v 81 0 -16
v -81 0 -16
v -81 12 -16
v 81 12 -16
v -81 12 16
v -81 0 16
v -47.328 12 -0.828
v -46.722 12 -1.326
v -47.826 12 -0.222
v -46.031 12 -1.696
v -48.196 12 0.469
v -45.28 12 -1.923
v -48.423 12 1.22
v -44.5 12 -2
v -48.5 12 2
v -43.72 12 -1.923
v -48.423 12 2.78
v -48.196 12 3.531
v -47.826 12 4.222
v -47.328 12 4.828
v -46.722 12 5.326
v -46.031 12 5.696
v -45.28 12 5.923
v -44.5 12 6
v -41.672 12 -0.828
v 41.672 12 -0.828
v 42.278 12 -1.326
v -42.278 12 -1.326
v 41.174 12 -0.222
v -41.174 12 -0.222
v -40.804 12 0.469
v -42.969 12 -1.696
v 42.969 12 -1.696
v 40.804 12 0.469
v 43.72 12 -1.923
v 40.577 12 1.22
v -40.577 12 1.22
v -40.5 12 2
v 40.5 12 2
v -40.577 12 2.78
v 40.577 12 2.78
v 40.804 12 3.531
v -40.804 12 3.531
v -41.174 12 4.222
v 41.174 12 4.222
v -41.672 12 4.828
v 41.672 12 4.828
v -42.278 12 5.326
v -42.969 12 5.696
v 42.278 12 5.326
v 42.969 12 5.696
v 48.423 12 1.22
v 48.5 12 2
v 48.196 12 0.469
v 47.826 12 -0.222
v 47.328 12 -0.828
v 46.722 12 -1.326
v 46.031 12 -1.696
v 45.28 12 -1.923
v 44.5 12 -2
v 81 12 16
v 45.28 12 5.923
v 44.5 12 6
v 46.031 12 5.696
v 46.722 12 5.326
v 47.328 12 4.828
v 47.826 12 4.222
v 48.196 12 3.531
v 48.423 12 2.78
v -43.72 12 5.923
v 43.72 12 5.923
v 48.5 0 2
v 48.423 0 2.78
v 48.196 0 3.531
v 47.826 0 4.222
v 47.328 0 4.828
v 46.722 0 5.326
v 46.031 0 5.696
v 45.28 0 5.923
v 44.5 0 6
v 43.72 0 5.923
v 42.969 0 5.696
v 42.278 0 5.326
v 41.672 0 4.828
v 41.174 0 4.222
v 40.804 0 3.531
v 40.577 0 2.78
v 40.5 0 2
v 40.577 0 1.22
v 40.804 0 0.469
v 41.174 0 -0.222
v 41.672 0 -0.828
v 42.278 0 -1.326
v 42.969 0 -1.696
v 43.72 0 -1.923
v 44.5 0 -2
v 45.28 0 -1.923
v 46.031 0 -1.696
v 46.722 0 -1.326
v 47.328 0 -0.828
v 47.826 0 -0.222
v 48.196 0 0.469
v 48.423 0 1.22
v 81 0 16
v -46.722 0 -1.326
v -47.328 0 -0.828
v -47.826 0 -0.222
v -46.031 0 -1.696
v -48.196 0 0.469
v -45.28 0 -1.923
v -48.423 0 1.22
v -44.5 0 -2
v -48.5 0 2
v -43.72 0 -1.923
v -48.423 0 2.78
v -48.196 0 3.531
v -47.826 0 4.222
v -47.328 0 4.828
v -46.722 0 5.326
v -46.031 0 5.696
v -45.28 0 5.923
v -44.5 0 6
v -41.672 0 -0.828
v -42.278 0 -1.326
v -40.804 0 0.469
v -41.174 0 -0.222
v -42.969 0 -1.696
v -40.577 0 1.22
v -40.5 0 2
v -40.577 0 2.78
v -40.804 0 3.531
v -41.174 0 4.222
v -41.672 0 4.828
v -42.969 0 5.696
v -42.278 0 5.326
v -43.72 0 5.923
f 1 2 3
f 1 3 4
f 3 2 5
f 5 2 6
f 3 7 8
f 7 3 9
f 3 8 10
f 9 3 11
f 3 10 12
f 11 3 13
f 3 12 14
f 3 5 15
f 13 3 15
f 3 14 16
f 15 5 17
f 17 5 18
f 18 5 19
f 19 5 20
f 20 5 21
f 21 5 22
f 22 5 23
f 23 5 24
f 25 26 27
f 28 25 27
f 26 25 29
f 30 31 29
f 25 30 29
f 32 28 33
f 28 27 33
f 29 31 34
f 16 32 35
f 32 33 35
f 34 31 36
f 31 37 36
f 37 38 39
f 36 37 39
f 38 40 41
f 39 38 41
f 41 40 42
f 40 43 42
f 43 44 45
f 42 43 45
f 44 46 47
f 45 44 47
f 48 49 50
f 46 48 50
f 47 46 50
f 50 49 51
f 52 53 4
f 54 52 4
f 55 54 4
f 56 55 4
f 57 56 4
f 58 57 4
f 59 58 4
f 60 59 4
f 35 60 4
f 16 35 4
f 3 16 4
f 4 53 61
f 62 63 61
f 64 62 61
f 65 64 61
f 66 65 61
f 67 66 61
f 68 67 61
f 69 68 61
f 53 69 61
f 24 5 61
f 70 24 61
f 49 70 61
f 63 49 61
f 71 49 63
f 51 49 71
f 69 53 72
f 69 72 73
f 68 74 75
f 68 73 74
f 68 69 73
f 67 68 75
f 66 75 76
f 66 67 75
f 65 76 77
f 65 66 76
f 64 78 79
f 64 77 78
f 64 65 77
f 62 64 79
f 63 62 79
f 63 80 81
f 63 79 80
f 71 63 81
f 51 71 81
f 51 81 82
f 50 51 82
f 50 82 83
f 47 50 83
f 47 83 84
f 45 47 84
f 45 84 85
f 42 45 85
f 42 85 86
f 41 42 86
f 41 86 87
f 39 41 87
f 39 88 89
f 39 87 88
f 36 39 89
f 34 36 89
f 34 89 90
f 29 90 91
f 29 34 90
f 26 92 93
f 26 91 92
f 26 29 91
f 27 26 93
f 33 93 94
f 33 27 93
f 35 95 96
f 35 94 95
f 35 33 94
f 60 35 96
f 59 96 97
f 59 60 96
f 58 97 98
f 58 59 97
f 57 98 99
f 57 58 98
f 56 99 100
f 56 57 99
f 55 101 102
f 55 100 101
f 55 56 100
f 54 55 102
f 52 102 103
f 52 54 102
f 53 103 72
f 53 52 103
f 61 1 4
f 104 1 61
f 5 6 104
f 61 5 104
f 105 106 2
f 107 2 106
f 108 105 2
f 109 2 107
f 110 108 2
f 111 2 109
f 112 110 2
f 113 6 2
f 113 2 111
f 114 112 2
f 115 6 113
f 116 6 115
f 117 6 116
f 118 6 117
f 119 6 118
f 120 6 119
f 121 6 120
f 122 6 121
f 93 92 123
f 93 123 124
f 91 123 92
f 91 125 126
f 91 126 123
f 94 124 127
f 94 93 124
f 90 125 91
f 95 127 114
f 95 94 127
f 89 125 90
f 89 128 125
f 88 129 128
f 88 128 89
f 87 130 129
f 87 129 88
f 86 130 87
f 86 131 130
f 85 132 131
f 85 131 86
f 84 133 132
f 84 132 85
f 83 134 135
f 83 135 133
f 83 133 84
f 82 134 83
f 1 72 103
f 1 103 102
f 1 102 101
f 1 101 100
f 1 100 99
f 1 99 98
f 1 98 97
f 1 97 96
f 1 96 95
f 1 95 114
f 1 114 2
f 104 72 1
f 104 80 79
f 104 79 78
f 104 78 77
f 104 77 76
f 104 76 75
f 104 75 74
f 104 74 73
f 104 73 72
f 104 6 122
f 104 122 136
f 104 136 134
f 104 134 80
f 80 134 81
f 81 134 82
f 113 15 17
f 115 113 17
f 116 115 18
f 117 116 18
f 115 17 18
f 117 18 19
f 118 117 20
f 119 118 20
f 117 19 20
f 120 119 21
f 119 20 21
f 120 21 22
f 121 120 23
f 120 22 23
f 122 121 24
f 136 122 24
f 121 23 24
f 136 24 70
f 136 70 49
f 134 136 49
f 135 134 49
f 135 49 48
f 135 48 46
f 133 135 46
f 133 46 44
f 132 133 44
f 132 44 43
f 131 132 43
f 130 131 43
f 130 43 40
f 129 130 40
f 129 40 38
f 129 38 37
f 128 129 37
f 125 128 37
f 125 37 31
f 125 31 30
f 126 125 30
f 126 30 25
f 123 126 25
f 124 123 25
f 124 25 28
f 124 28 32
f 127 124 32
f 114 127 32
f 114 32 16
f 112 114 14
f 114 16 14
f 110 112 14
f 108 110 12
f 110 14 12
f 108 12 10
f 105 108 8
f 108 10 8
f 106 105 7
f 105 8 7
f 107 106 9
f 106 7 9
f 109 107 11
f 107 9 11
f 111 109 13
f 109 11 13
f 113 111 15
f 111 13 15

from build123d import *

# Parameters (mm, degrees)
F0_W     = 162
F0_H     = 32
F1_DEPTH = 12
F3_D     = 8


# Not quite as in the source:
# - a pattern or mirror of a feature is missing from the dataset's text; its kind, count and spacing are read off the source's solid


with BuildPart() as f1:
    # F0 (on Front) → F1 (new body)
    with BuildSketch(Plane.XZ):
        Rectangle(F0_W, F0_H)
    extrude(amount=-F1_DEPTH)

    # F3 (through all)
    with Locations(Plane.XZ):
        with Locations((-44.5, 2)):
            f3 = Hole(F3_D / 2)

    # F3_copies: F3 across plane
    add(f3.mirror(Plane(origin=(0, 0, 0), x_dir=(0, 0, 1), z_dir=(1, 0, 0))), mode=Mode.SUBTRACT)


solid = f1.part
